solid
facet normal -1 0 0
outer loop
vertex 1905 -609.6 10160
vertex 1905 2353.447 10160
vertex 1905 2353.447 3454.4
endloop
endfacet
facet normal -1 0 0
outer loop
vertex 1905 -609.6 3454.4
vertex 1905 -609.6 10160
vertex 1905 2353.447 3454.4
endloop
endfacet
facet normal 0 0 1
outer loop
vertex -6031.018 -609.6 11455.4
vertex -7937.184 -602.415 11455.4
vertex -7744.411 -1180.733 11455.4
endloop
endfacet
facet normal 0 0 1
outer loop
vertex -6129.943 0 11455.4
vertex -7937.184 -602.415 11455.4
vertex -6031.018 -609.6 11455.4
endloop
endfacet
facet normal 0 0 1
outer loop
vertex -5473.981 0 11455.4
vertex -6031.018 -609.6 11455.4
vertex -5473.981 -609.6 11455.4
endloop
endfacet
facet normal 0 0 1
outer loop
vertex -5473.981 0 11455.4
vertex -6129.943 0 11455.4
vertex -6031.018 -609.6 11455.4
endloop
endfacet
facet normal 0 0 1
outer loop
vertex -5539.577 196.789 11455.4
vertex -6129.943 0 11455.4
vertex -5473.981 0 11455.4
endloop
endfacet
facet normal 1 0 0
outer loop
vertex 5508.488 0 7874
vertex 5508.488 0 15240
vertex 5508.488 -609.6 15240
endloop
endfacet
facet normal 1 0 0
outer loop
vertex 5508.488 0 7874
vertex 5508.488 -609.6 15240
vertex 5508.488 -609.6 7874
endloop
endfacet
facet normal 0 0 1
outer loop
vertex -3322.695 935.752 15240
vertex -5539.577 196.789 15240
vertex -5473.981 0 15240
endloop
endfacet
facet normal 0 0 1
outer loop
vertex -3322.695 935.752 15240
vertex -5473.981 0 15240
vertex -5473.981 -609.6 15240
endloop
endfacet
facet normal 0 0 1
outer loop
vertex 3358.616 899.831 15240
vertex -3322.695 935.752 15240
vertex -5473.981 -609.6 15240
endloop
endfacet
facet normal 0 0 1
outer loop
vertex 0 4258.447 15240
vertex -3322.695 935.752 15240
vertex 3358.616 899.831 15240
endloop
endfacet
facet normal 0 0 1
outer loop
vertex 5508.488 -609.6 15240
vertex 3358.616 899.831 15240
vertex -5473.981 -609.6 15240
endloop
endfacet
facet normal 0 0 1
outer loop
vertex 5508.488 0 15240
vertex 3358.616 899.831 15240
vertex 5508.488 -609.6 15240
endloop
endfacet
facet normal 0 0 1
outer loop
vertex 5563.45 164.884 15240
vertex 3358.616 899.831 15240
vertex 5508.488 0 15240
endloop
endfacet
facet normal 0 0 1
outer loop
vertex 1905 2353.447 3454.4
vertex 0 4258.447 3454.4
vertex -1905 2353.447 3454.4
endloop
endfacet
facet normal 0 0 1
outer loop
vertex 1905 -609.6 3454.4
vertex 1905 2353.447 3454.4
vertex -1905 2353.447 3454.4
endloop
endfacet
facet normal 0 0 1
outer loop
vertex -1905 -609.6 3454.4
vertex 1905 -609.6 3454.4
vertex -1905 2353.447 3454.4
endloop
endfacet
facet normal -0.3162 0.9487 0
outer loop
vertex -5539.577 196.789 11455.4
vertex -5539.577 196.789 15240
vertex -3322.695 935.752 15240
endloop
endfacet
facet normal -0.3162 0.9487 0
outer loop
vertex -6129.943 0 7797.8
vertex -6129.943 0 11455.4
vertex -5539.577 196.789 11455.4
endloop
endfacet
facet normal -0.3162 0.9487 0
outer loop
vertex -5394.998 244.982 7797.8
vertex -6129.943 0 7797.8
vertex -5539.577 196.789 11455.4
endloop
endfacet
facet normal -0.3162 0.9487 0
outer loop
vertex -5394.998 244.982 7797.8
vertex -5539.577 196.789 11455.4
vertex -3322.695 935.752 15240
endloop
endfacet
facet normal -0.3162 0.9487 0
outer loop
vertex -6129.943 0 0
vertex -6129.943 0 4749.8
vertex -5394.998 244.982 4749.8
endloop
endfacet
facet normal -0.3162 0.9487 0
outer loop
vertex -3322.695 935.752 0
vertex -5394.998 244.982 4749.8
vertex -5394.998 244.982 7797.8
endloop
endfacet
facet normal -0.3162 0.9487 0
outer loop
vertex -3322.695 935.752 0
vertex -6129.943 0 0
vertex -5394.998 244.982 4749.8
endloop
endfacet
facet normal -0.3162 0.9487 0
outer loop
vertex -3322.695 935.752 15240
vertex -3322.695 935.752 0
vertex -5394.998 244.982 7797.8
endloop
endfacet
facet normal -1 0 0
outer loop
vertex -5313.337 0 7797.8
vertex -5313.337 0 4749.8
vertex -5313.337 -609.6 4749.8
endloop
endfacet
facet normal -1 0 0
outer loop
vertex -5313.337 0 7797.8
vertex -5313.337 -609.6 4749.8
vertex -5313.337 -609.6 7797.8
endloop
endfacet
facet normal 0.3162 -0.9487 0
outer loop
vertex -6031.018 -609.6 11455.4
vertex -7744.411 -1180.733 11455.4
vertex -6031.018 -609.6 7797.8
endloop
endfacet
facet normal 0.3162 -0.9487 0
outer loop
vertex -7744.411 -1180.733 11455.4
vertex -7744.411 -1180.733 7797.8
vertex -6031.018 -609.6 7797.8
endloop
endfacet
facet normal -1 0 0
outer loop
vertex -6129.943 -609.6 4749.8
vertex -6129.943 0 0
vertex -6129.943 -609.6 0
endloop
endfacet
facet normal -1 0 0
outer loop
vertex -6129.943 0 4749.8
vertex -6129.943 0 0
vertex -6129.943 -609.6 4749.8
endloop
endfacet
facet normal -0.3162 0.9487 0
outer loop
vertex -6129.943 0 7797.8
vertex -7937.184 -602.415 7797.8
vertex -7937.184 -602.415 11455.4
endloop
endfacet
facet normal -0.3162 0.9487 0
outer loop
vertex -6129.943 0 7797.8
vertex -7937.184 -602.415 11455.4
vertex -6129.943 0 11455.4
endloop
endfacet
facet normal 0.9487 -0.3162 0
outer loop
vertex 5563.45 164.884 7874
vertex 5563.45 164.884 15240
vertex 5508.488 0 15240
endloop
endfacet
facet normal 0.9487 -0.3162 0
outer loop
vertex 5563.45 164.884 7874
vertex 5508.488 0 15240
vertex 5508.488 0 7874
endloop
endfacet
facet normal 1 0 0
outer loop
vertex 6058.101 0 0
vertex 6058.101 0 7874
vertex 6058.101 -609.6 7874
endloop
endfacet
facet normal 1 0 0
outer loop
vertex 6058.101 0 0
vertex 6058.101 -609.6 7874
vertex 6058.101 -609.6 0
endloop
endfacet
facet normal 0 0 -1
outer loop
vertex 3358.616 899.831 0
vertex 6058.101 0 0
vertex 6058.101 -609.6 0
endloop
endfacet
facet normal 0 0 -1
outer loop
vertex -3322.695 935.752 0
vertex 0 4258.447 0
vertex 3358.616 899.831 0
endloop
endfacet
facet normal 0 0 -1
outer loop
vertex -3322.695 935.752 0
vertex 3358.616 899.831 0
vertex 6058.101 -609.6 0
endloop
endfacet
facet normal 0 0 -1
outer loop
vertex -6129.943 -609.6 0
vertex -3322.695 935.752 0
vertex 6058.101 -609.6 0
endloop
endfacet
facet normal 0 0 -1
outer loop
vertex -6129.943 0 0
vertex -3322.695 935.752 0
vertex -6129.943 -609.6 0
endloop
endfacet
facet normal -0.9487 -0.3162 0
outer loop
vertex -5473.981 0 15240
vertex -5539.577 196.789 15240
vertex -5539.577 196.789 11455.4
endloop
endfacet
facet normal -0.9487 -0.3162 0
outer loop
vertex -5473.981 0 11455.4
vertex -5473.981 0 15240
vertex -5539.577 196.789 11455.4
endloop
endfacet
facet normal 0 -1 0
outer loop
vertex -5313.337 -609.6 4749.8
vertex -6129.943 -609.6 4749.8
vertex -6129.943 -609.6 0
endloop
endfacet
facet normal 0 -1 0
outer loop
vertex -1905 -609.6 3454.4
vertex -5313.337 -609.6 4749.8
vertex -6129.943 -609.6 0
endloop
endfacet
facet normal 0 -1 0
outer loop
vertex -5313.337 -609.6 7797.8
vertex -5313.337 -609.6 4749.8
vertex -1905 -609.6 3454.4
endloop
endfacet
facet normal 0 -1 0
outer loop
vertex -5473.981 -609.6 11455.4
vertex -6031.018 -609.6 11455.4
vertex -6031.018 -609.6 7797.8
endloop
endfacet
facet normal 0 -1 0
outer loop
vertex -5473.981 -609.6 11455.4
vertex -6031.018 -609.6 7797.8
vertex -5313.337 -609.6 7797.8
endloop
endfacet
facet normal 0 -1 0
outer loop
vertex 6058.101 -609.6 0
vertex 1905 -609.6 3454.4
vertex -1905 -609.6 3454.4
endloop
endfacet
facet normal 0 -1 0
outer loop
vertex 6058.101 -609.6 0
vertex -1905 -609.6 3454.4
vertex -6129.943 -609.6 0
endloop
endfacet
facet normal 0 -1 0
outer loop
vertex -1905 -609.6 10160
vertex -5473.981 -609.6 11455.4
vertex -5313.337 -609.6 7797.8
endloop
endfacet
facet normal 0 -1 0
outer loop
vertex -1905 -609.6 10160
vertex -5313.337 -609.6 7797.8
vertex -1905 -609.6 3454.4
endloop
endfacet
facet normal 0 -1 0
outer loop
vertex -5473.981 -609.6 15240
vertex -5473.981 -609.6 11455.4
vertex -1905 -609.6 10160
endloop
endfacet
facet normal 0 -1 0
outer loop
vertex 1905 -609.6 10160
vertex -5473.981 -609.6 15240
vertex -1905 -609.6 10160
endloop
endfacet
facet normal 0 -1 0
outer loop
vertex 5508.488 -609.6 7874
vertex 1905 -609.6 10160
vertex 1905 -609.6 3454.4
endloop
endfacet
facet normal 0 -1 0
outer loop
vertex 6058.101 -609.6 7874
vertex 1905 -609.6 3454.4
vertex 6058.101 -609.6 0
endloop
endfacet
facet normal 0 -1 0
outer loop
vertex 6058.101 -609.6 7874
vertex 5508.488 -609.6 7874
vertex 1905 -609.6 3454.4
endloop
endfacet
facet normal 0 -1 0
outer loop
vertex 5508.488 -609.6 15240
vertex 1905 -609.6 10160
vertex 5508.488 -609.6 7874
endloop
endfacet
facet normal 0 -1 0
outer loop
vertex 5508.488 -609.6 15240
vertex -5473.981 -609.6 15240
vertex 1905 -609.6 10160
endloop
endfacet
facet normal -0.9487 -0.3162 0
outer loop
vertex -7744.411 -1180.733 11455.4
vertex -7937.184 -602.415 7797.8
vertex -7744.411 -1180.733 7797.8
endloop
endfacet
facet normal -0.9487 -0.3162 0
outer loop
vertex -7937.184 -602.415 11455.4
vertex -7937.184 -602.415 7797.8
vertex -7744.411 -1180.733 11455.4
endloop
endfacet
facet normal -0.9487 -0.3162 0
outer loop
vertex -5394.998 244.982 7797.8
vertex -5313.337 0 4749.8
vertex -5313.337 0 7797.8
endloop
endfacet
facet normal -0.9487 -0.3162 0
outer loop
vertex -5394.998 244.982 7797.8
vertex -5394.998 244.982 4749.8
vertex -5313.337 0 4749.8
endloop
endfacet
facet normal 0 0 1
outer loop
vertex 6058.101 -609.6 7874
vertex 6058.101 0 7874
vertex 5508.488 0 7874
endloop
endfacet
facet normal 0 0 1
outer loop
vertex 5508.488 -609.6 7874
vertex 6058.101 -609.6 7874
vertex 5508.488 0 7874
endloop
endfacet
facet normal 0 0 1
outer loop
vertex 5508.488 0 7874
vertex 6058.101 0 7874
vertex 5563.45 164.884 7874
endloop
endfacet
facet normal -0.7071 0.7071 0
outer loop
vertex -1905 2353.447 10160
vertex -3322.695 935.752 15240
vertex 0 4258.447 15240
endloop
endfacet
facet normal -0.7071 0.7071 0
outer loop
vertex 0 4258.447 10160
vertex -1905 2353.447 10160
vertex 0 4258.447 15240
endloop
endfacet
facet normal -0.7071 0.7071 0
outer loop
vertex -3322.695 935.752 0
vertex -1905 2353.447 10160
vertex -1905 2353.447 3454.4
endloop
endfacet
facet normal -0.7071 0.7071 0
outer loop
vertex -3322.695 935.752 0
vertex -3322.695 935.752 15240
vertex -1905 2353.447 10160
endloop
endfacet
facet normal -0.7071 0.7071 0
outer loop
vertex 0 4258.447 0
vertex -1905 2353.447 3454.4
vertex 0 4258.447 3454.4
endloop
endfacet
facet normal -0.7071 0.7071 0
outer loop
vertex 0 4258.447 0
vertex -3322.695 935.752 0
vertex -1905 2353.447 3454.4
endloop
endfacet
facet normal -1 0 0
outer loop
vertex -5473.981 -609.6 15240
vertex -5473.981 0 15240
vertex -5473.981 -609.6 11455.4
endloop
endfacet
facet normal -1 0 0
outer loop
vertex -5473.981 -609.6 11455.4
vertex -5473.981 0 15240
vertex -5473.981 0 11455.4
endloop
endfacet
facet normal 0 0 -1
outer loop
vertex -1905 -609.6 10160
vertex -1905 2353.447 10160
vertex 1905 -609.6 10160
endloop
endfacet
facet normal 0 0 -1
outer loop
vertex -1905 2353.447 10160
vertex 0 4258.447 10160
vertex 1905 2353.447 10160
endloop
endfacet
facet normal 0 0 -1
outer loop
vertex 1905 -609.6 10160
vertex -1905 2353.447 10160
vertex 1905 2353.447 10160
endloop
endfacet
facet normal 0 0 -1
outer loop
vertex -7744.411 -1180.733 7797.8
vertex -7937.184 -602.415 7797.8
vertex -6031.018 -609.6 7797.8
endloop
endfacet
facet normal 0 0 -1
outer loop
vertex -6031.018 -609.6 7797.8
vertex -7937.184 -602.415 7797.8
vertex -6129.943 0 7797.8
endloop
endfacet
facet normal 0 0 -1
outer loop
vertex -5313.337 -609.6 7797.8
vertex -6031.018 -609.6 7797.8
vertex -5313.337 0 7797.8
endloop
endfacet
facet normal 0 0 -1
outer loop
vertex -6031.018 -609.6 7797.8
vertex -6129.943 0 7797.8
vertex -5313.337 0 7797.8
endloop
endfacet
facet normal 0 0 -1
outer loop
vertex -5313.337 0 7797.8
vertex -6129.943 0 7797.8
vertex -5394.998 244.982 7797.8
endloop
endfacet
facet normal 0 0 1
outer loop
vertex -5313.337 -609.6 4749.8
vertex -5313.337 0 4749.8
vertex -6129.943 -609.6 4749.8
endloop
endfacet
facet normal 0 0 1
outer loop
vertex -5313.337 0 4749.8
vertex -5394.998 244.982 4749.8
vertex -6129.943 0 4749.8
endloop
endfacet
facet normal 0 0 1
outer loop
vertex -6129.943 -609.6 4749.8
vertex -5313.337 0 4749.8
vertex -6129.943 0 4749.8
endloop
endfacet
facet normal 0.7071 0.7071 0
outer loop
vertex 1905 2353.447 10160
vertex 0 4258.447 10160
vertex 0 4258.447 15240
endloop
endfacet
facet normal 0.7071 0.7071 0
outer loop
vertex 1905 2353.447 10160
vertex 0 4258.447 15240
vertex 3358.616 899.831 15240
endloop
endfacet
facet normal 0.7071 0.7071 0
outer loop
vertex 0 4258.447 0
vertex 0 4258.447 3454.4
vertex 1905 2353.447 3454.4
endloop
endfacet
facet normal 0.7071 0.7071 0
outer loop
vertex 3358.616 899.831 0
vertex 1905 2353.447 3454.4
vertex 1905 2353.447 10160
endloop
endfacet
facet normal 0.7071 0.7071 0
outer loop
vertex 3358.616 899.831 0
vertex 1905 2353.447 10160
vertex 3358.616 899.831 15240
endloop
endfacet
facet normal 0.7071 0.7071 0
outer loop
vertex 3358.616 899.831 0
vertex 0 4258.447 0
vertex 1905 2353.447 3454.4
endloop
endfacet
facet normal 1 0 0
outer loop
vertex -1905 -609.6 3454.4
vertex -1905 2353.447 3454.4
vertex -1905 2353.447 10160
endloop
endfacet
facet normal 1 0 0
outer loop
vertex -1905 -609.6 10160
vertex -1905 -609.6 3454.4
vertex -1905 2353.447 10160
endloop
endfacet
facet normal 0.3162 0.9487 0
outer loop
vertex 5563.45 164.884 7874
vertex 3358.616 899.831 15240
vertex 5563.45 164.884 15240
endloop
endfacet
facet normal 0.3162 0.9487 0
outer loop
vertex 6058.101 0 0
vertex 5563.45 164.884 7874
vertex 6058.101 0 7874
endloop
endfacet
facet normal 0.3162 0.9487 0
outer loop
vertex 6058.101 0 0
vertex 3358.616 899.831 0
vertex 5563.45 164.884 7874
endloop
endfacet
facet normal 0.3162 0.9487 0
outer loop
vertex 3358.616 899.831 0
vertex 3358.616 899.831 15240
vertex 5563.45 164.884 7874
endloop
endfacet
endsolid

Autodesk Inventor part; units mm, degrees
ref_plane "YZ Plane" through (0, 0, 0) normal (1, 0, 0) x (0, 1, 0)
ref_plane "XY Plane" through (0, 0, 0) normal (0, 0, 1) x (1, 0, 0)
sketch "Sketch1" plane through (0, 0, 0) normal (0, 0, 1) x (1, 0, 0)
  line L0 (0, 0) -> (-6129.9427, 0)
  line L1 (-6129.9427, 0) -> (-3322.6948, 935.7521)
  line L2 (-3322.6948, 935.7521) -> (-1557.9427, 935.7521) construction
  line L3 (-3322.6948, 935.7521) -> (0, 4258.4469)
  line L4 (0, 4258.4469) -> (0, 0) construction
  line L5 (0, 4258.4469) -> (3358.6158, 899.8311)
  line L6 (3358.6158, 899.8311) -> (0, 899.8311) construction
  line L7 (3358.6158, 899.8311) -> (6058.1009, 0)
  line L8 (6058.1009, 0) -> (0, 0)
  dimension "d1" = 18.435
  dimension "d2" = 2959.1
  dimension "d4" = 45
  dimension "d6" = 4699
  dimension "d7" = 45
  dimension "d8" = 4749.8
  dimension "d9" = 18.435
  dimension "d10" = 2845.508
extrude "Extrusion1" add sketch "Sketch1" along normal blind 15240
sketch "Sketch2" plane through (3358.6158, 899.8311, 15240) normal (0.3162286, 0.948683, 0) x (0.948683, -0.3162286, 0)
  line L0 (2845.5081, 0) -> (0, 0) projected
  line L1 (2845.5081, 0) -> (2324.1, 0)
  line L2 (2324.1, 0) -> (2324.1, 7366)
  line L3 (2324.1, 7366) -> (2845.5081, 7366)
  line L4 (2845.5081, 7366) -> (2845.5081, 0)
  line L5 (2845.5081, 15240) -> (0, 15240) projected
  line L6 (0, 15240) -> (0, 0) projected
  point P0 (-2901.7094, 15240)
  point P1 (2324.1, 0)
  dimension "d13" = 7874
  dimension "d14" = 2324.1
extrude "Extrusion2" cut sketch "Sketch2" against normal through all
sketch "Sketch3" plane through (-6129.9427, 0, 15240) normal (-0.3162286, 0.948683, 0) x (0.948683, 0.3162286, 0)
  line L0 (0, 0) -> (622.3, 0)
  line L1 (622.3, 0) -> (622.3, 3784.6)
  line L2 (622.3, 3784.6) -> (0, 3784.6)
  line L3 (0, 3784.6) -> (0, 0)
  line L4 (2959.1, 15240) -> (2959.1, 0) projected
  point P0 (5815.3725, 15240)
  dimension "d17" = 2336.8
  dimension "d18" = 3784.6
extrude "Extrusion3" cut sketch "Sketch3" against normal through all
sketch "Sketch4" plane through (-3322.6948, 935.7521, 15240) normal (-0.3162286, 0.948683, 0) x (0.948683, 0.3162286, 0)
  line L0 (-2959.1, 15240) -> (-2959.1, 3784.6) projected
  line L1 (-2959.1, 10490.2) -> (-2184.4, 10490.2)
  line L2 (-2184.4, 10490.2) -> (-2184.4, 7442.2)
  line L3 (-2184.4, 7442.2) -> (-2959.1, 7442.2)
  line L4 (-2959.1, 7442.2) -> (-2959.1, 10490.2)
  line L5 (0, 15240) -> (-2959.1, 15240) projected
  line L6 (0, 15240) -> (0, 0) projected
  line L7 (-2959.1, 3784.6) -> (-2336.8, 3784.6) projected
  point P0 (2856.2725, 15240)
  point P1 (-2959.1, 7442.2)
  dimension "d22" = 4749.8
  dimension "d23" = 2184.4
  dimension "d24" = 3657.6
extrude "Extrusion4" cut sketch "Sketch4" against normal through all
sketch "Sketch5" plane through (-6129.9427, 0, 0) normal (0, -1, 0) x (1, 0, 0)
  line L0 (655.962, 15240) -> (11638.4311, 15240) projected
  line L1 (655.962, 15240) -> (11638.4311, 15240)
  line L2 (11693.3927, 7874) -> (11638.4311, 7874) projected
  line L3 (11638.4311, 15240) -> (11638.4311, 7874)
  line L4 (11638.4311, 7874) -> (12188.0436, 7874)
  line L5 (12188.0436, 0) -> (9488.5585, 0) projected
  line L6 (12188.0436, 7874) -> (12188.0436, 0)
  line L7 (2807.2479, 0) -> (0, 0) projected
  line L8 (12188.0436, 0) -> (0, 0)
  line L9 (0, 0) -> (0, 4749.8) projected
  line L10 (0, 0) -> (0, 4749.8)
  line L11 (816.6057, 4749.8) -> (0, 4749.8) projected
  line L12 (0, 4749.8) -> (816.6057, 4749.8)
  line L13 (734.9447, 7797.8) -> (816.6057, 7797.8) projected
  line L14 (816.6057, 4749.8) -> (816.6057, 7797.8)
  line L15 (734.9447, 7797.8) -> (0, 7797.8) projected
  line L16 (816.6057, 7797.8) -> (0, 7797.8)
  line L17 (0, 7797.8) -> (0, 11455.4) projected
  line L18 (0, 7797.8) -> (0, 11455.4)
  line L19 (655.962, 15240) -> (655.962, 11455.4) projected
  line L20 (0, 11455.4) -> (655.962, 11455.4)
  line L21 (655.962, 11455.4) -> (655.962, 15240)
  point P0 (6129.9427, 0)
extrude "Extrusion5" add sketch "Sketch5" along normal blind 609.6
sketch "Sketch6" plane through (-3322.6948, 935.7521, 15240) normal (-0.3162286, 0.948683, 0) x (0.948683, 0.3162286, 0)
  line L0 (-2184.4, 7442.2) -> (-2959.1, 7442.2) projected
  line L1 (-2959.1, 7442.2) -> (-4864.1, 7442.2)
  line L2 (-4864.1, 7442.2) -> (-4864.1, 3784.6)
  line L3 (-4864.1, 3784.6) -> (-2959.1, 3784.6)
  line L4 (-2959.1, 3784.6) -> (-2959.1, 7442.2)
  point P0 (2856.2725, 15240)
  dimension "d29" = 1905
extrude "Extrusion6" add sketch "Sketch6" against normal blind 609.6
ref_plane "Work Plane1" through (0, 4258.4469, 15240) normal (0, 1, 0) x (-1, 0, 0)
sketch "Sketch7" plane through (0, 4258.4469, 15240) normal (0, 1, 0) x (-1, 0, 0)
  line L0 (1905, -5080) -> (-1905, -5080)
  line L1 (-1905, -5080) -> (-1905, -11785.6)
  line L2 (-1905, -11785.6) -> (1905, -11785.6)
  line L3 (1905, -11785.6) -> (1905, -5080)
  line L4 (0, -15240) -> (0, 0) projected
  line L5 (1905, -5080) -> (-1905, -11785.6) construction
  line L6 (-1905, -5080) -> (1905, -11785.6) construction
  point P0 (0, -8432.8)
  dimension "d32" = 5080
  dimension "d33" = 6705.6
  dimension "d34" = 3810
extrude "Extrusion7" cut sketch "Sketch7" against normal through all
equation "\"d1\" = pitch_4_12"
equation "\"d4\" = pitch_12_12"
equation "\"d7\" = pitch_12_12"
equation "\"d9\" = pitch_4_12"
equation "\"pitch_4_12\" = 18.435deg"
equation "\"pitch_12_12\" = 45deg"
properties part number "12-12-PartOfHouseRoof"
